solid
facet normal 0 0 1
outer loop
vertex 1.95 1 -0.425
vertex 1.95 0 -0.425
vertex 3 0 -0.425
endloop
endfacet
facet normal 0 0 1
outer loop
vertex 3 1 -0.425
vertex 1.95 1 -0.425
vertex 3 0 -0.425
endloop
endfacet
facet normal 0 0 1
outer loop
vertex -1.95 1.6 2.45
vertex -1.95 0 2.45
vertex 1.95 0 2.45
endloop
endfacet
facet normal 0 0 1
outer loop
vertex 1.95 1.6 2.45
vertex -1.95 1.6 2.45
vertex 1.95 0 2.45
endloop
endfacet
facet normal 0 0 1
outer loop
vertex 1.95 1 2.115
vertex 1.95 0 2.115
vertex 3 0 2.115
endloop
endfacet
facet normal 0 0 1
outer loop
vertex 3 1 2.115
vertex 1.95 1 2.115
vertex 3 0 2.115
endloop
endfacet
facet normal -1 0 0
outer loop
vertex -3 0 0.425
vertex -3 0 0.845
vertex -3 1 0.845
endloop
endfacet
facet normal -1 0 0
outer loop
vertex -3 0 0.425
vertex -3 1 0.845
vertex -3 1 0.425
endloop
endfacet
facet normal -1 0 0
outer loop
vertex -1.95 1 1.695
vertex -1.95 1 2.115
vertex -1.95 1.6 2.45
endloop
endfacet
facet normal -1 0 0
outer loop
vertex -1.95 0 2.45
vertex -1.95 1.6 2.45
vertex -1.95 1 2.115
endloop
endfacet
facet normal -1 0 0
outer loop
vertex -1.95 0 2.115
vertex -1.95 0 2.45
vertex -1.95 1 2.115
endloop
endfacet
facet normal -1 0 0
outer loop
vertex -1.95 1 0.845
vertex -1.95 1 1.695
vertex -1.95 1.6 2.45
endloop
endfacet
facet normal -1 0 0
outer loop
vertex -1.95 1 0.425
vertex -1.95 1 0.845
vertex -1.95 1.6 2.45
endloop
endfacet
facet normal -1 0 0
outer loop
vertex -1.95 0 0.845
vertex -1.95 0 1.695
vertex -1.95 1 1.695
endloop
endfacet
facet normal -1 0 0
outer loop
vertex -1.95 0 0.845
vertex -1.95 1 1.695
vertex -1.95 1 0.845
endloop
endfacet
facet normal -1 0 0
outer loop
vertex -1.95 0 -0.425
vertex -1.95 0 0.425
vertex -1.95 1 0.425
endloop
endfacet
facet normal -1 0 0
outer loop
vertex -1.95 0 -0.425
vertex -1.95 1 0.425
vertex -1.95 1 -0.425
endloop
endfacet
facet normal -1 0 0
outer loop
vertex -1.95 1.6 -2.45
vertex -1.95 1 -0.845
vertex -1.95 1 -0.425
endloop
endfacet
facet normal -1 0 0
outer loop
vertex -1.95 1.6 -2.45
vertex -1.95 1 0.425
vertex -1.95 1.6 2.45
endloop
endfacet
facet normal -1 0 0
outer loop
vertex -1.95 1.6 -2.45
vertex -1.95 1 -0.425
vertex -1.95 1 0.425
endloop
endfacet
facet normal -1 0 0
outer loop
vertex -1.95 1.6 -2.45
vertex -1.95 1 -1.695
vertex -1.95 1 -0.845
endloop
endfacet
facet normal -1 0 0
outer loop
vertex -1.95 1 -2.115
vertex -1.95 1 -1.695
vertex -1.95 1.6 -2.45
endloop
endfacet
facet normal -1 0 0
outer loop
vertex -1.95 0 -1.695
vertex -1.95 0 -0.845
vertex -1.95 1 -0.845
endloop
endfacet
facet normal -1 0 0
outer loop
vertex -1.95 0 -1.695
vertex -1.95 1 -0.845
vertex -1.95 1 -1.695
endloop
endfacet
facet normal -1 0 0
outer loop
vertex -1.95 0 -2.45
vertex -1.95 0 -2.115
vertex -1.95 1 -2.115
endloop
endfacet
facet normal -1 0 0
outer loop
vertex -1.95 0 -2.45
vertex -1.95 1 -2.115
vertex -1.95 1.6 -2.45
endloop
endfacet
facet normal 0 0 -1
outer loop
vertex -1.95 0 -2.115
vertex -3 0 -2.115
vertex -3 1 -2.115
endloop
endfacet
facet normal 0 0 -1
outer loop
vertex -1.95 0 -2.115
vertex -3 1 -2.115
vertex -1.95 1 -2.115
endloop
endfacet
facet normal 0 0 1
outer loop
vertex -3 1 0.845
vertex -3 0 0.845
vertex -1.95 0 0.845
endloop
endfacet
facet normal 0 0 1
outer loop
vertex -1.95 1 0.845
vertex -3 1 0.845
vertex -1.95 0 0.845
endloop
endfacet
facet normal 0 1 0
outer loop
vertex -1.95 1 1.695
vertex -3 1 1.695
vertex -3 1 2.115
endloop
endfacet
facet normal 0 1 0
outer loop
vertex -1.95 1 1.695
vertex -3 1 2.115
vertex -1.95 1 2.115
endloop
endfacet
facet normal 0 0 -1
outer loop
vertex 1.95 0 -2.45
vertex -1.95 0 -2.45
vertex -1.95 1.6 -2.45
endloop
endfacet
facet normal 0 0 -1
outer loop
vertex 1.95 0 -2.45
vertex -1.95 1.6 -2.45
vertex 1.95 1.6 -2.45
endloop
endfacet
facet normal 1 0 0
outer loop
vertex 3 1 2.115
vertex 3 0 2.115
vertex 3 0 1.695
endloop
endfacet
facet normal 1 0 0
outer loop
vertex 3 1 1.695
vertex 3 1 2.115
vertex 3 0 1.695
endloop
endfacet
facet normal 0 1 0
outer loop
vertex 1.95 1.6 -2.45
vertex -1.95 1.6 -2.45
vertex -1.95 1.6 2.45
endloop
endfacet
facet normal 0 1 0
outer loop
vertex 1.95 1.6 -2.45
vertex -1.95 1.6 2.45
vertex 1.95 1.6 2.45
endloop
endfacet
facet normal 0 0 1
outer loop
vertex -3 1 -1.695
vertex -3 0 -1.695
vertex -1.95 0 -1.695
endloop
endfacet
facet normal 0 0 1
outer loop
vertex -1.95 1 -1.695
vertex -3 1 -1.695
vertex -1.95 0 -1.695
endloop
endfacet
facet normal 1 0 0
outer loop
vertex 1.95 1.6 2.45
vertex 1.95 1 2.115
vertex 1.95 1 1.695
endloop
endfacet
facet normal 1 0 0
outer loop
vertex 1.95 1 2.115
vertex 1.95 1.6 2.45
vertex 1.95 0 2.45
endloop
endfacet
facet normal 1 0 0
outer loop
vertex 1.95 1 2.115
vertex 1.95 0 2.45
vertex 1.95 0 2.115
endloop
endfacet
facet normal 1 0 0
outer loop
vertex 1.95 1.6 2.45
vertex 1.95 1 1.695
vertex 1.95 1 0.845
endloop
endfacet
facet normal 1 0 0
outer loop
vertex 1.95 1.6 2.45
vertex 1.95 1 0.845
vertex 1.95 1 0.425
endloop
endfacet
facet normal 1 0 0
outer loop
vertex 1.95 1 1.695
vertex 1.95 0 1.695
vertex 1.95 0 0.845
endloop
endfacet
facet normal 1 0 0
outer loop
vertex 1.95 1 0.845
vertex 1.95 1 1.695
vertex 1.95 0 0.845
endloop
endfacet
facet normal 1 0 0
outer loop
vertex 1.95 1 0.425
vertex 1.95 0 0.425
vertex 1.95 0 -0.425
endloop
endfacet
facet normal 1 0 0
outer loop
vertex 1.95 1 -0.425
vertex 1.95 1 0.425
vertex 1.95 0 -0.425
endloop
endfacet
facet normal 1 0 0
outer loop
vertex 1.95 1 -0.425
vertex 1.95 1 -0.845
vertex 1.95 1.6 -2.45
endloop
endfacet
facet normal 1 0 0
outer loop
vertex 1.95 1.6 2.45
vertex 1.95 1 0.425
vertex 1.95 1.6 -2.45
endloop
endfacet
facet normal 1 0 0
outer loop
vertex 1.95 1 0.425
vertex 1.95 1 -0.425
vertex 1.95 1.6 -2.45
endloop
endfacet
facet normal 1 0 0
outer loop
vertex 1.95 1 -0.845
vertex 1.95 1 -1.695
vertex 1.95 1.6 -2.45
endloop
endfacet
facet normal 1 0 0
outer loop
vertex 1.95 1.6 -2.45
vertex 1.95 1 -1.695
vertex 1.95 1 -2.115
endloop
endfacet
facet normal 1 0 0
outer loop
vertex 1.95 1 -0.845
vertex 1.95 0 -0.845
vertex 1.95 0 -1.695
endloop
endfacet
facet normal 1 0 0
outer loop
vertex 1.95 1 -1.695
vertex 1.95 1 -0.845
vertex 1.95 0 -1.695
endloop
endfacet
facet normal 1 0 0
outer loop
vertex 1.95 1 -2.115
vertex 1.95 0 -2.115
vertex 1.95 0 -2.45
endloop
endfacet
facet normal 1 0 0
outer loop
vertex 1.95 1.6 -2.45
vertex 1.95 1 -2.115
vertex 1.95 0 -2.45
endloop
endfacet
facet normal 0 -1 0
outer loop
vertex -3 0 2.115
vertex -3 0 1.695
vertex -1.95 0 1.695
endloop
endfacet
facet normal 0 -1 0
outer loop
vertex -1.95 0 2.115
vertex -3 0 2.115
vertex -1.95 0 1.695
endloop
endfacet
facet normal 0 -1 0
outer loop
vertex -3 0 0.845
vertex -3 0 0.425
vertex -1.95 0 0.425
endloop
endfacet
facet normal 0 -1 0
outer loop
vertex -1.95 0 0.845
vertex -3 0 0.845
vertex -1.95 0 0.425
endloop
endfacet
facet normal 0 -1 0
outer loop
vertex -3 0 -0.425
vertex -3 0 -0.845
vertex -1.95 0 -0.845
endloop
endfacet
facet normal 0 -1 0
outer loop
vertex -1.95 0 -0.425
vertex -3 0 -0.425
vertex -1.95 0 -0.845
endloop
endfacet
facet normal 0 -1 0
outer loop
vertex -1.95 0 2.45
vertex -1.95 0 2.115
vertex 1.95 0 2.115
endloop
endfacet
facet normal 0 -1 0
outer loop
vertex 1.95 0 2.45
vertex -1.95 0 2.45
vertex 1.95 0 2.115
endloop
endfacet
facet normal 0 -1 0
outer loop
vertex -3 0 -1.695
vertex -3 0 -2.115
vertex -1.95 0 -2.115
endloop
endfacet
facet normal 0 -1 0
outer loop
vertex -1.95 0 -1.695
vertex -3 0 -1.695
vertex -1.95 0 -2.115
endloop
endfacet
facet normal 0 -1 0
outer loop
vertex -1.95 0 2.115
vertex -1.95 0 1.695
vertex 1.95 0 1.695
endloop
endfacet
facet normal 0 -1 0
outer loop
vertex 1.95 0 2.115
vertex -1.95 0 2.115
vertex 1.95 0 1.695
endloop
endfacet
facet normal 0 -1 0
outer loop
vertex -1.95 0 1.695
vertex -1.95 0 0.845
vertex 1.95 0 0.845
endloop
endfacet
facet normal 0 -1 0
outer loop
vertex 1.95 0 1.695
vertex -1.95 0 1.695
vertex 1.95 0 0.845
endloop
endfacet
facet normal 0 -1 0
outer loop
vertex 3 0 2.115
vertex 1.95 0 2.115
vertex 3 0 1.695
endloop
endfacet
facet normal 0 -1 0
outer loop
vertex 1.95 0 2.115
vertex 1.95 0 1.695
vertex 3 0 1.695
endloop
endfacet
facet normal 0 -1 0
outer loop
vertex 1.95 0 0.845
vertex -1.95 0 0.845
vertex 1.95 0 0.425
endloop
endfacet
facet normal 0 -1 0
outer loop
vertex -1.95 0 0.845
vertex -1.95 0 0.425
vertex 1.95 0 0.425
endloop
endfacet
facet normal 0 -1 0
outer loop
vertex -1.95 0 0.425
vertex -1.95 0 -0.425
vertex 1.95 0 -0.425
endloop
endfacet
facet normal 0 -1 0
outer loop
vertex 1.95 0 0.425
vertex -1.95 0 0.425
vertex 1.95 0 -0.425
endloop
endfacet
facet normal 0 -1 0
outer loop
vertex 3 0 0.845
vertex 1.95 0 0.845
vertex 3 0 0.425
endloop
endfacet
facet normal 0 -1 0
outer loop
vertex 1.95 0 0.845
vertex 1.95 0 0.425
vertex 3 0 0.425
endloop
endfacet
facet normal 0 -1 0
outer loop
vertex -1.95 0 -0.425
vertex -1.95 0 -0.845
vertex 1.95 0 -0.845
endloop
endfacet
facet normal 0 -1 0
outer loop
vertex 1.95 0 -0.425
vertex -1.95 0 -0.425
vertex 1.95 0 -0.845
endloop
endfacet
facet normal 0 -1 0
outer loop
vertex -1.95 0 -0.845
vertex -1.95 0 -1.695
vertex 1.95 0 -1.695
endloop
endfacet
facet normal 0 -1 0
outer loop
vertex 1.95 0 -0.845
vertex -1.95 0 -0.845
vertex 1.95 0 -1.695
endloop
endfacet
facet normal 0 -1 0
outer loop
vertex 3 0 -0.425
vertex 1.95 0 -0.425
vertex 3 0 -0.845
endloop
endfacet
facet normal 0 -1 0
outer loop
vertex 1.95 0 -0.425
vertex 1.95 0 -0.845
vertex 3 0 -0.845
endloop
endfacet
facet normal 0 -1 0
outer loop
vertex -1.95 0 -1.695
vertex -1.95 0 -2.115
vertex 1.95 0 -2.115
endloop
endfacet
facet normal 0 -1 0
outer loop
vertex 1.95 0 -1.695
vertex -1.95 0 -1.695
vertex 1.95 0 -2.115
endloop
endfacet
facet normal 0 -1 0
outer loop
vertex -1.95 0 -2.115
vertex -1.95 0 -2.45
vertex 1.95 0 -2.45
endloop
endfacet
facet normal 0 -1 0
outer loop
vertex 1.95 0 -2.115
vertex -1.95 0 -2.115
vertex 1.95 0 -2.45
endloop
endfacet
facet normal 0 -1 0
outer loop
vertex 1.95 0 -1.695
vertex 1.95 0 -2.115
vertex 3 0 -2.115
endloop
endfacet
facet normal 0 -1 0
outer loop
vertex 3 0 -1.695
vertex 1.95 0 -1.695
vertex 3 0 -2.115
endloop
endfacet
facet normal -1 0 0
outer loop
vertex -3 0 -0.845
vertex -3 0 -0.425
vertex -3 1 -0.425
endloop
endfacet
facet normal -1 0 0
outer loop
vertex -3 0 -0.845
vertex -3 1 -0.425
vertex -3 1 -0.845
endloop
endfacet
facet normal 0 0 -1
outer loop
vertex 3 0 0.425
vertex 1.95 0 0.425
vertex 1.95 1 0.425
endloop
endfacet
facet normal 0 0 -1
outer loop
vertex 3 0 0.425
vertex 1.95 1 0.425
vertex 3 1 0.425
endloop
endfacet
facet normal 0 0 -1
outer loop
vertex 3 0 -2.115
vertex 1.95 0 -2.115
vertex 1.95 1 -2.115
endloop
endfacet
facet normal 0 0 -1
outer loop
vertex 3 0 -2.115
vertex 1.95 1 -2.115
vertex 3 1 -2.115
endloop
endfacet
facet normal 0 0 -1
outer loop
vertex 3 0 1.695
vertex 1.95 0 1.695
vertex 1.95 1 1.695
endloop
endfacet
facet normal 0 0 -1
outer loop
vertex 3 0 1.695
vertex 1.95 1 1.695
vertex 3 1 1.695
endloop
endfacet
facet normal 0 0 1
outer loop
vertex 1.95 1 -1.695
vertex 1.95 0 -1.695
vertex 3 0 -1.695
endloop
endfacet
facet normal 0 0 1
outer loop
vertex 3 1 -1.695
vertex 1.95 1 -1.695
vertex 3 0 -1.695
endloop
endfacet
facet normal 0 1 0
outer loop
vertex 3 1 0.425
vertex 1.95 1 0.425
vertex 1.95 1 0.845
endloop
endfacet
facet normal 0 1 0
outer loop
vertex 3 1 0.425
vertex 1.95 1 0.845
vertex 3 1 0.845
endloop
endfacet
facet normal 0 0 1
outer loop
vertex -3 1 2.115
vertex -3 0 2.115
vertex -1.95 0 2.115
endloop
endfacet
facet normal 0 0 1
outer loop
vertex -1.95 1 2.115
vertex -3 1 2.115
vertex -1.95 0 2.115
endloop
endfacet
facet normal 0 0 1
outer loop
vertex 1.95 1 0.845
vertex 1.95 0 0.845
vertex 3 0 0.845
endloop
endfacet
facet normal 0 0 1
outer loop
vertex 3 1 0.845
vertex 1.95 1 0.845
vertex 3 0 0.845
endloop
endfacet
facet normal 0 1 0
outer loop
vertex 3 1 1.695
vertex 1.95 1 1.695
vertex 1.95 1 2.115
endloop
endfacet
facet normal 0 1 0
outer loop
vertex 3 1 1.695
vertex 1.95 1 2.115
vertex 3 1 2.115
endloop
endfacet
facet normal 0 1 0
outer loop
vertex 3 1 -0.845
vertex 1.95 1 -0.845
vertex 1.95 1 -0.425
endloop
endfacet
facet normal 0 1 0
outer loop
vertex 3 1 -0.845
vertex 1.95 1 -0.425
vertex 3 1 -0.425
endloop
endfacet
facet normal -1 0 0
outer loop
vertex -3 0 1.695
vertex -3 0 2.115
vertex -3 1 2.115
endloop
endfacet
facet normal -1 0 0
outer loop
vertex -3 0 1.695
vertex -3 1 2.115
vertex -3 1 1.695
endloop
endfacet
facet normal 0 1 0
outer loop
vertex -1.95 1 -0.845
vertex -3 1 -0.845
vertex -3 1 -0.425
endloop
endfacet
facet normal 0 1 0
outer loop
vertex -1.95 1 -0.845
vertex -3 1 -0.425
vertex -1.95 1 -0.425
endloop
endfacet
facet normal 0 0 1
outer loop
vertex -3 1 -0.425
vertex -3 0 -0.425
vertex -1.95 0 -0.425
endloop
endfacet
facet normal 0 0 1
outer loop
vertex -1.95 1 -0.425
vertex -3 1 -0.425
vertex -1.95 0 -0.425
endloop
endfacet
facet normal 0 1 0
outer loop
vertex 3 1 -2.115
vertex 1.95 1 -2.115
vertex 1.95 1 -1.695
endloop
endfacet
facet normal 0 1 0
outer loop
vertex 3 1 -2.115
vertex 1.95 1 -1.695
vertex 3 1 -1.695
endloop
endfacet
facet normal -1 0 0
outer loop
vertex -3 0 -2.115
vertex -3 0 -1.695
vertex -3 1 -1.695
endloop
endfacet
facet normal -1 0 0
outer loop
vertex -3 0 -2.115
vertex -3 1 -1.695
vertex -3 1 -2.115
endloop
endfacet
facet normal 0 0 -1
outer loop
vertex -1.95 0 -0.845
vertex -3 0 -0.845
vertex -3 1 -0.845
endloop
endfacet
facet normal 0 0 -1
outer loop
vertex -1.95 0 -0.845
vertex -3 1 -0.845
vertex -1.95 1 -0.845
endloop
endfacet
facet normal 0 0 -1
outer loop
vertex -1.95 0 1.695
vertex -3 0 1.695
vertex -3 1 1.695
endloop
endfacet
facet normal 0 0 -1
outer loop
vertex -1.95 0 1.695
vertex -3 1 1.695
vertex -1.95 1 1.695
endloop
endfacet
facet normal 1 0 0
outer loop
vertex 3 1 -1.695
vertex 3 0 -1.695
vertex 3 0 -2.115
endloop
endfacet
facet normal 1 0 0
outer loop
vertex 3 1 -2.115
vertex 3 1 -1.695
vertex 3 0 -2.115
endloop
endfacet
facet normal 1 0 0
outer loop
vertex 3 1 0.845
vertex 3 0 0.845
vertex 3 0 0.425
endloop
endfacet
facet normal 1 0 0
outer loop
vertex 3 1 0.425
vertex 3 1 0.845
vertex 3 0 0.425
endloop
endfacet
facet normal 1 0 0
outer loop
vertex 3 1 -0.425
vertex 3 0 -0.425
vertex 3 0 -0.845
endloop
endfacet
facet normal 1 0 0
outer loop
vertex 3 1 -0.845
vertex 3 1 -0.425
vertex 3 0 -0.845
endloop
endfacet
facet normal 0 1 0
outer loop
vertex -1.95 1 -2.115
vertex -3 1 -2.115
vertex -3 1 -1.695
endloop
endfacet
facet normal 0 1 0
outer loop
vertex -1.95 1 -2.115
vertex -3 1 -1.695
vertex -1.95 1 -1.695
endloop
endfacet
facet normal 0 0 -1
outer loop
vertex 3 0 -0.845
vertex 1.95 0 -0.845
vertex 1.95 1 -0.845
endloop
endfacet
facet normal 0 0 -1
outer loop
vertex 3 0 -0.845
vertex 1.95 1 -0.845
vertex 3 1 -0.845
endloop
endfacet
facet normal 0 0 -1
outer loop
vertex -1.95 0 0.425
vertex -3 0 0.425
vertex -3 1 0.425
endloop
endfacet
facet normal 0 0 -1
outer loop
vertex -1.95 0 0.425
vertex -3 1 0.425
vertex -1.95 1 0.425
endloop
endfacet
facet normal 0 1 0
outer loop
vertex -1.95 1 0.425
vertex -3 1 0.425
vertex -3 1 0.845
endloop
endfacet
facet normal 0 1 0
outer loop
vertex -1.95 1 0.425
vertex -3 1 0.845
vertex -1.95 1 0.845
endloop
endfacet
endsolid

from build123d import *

# Parameters (mm, degrees)
SKETCH1_W      = 3.9
SKETCH1_H      = 4.9
EXTRUDE1_DEPTH = 1.6
SKETCH2_W      = 1.05
SKETCH2_H      = 0.42
EXTRUDE2_DEPTH = 1


with BuildPart() as part:
    # Sketch1 → Extrude1 (new body)
    with BuildSketch(Plane(origin=(0, 0, 0), x_dir=(1, 0, 0), z_dir=(0, 1, 0))):
        Rectangle(SKETCH1_W, SKETCH1_H)
    extrude(amount=EXTRUDE1_DEPTH)

    # Sketch2 → Extrude2 (add)
    with BuildSketch(Plane(origin=(0, 0, 0), x_dir=(1, 0, 0), z_dir=(0, 1, 0))):
        with Locations((-2.475, 1.905)):
            Rectangle(SKETCH2_W, SKETCH2_H)
        with Locations((-2.475, 0.635)):
            Rectangle(SKETCH2_W, SKETCH2_H)
        with Locations((-2.475, -0.635)):
            Rectangle(SKETCH2_W, SKETCH2_H)
        with Locations((-2.475, -1.905)):
            Rectangle(SKETCH2_W, SKETCH2_H)
        with Locations((2.475, -1.905)):
            Rectangle(SKETCH2_W, SKETCH2_H)
        with Locations((2.475, -0.635)):
            Rectangle(SKETCH2_W, SKETCH2_H)
        with Locations((2.475, 0.635)):
            Rectangle(SKETCH2_W, SKETCH2_H)
        with Locations((2.475, 1.905)):
            Rectangle(SKETCH2_W, SKETCH2_H)
    extrude(amount=EXTRUDE2_DEPTH)


solid = part.part
